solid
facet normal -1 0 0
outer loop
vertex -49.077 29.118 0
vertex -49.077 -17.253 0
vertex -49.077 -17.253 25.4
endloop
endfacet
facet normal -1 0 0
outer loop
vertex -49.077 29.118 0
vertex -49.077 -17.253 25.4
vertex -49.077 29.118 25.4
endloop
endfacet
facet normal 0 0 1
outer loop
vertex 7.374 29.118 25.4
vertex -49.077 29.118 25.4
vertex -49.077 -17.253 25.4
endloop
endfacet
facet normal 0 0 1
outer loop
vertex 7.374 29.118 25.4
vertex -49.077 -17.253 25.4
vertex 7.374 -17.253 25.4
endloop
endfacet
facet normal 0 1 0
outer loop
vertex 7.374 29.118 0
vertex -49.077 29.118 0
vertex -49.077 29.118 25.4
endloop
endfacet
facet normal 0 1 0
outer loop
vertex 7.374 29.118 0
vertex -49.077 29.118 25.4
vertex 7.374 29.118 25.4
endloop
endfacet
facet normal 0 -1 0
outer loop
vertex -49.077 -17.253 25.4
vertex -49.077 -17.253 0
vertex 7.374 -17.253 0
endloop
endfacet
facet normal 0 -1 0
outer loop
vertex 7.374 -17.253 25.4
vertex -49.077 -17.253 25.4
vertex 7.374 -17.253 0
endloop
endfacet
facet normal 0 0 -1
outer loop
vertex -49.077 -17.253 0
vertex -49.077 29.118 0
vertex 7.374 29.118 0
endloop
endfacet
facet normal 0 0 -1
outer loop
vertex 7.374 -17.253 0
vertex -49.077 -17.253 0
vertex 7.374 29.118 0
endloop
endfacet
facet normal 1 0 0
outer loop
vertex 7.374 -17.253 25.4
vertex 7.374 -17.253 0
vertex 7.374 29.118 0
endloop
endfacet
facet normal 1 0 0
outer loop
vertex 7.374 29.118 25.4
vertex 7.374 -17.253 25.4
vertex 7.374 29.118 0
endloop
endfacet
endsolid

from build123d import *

# Parameters (mm, degrees)
F0_W     = 56.450994
F0_H     = 46.370463
F1_DEPTH = 25.4
F2_R     = 10.418213
F3_DEPTH = 12.7


with BuildPart() as f1:
    # F0 (on Top) → F1 (new body)
    with BuildSketch(Plane.XY):
        with Locations((-20.85122, 5.932314)):
            Rectangle(F0_W, F0_H)
    extrude(amount=F1_DEPTH)


with BuildPart() as f3:
    # F2 (on face) → F3 (new body, symmetric)
    with BuildSketch(Plane.XY.offset(25.4)):
        with Locations((-23.669293, 5.861445)):
            Circle(F2_R)
    extrude(amount=F3_DEPTH, both=True)


solid = f1.part
